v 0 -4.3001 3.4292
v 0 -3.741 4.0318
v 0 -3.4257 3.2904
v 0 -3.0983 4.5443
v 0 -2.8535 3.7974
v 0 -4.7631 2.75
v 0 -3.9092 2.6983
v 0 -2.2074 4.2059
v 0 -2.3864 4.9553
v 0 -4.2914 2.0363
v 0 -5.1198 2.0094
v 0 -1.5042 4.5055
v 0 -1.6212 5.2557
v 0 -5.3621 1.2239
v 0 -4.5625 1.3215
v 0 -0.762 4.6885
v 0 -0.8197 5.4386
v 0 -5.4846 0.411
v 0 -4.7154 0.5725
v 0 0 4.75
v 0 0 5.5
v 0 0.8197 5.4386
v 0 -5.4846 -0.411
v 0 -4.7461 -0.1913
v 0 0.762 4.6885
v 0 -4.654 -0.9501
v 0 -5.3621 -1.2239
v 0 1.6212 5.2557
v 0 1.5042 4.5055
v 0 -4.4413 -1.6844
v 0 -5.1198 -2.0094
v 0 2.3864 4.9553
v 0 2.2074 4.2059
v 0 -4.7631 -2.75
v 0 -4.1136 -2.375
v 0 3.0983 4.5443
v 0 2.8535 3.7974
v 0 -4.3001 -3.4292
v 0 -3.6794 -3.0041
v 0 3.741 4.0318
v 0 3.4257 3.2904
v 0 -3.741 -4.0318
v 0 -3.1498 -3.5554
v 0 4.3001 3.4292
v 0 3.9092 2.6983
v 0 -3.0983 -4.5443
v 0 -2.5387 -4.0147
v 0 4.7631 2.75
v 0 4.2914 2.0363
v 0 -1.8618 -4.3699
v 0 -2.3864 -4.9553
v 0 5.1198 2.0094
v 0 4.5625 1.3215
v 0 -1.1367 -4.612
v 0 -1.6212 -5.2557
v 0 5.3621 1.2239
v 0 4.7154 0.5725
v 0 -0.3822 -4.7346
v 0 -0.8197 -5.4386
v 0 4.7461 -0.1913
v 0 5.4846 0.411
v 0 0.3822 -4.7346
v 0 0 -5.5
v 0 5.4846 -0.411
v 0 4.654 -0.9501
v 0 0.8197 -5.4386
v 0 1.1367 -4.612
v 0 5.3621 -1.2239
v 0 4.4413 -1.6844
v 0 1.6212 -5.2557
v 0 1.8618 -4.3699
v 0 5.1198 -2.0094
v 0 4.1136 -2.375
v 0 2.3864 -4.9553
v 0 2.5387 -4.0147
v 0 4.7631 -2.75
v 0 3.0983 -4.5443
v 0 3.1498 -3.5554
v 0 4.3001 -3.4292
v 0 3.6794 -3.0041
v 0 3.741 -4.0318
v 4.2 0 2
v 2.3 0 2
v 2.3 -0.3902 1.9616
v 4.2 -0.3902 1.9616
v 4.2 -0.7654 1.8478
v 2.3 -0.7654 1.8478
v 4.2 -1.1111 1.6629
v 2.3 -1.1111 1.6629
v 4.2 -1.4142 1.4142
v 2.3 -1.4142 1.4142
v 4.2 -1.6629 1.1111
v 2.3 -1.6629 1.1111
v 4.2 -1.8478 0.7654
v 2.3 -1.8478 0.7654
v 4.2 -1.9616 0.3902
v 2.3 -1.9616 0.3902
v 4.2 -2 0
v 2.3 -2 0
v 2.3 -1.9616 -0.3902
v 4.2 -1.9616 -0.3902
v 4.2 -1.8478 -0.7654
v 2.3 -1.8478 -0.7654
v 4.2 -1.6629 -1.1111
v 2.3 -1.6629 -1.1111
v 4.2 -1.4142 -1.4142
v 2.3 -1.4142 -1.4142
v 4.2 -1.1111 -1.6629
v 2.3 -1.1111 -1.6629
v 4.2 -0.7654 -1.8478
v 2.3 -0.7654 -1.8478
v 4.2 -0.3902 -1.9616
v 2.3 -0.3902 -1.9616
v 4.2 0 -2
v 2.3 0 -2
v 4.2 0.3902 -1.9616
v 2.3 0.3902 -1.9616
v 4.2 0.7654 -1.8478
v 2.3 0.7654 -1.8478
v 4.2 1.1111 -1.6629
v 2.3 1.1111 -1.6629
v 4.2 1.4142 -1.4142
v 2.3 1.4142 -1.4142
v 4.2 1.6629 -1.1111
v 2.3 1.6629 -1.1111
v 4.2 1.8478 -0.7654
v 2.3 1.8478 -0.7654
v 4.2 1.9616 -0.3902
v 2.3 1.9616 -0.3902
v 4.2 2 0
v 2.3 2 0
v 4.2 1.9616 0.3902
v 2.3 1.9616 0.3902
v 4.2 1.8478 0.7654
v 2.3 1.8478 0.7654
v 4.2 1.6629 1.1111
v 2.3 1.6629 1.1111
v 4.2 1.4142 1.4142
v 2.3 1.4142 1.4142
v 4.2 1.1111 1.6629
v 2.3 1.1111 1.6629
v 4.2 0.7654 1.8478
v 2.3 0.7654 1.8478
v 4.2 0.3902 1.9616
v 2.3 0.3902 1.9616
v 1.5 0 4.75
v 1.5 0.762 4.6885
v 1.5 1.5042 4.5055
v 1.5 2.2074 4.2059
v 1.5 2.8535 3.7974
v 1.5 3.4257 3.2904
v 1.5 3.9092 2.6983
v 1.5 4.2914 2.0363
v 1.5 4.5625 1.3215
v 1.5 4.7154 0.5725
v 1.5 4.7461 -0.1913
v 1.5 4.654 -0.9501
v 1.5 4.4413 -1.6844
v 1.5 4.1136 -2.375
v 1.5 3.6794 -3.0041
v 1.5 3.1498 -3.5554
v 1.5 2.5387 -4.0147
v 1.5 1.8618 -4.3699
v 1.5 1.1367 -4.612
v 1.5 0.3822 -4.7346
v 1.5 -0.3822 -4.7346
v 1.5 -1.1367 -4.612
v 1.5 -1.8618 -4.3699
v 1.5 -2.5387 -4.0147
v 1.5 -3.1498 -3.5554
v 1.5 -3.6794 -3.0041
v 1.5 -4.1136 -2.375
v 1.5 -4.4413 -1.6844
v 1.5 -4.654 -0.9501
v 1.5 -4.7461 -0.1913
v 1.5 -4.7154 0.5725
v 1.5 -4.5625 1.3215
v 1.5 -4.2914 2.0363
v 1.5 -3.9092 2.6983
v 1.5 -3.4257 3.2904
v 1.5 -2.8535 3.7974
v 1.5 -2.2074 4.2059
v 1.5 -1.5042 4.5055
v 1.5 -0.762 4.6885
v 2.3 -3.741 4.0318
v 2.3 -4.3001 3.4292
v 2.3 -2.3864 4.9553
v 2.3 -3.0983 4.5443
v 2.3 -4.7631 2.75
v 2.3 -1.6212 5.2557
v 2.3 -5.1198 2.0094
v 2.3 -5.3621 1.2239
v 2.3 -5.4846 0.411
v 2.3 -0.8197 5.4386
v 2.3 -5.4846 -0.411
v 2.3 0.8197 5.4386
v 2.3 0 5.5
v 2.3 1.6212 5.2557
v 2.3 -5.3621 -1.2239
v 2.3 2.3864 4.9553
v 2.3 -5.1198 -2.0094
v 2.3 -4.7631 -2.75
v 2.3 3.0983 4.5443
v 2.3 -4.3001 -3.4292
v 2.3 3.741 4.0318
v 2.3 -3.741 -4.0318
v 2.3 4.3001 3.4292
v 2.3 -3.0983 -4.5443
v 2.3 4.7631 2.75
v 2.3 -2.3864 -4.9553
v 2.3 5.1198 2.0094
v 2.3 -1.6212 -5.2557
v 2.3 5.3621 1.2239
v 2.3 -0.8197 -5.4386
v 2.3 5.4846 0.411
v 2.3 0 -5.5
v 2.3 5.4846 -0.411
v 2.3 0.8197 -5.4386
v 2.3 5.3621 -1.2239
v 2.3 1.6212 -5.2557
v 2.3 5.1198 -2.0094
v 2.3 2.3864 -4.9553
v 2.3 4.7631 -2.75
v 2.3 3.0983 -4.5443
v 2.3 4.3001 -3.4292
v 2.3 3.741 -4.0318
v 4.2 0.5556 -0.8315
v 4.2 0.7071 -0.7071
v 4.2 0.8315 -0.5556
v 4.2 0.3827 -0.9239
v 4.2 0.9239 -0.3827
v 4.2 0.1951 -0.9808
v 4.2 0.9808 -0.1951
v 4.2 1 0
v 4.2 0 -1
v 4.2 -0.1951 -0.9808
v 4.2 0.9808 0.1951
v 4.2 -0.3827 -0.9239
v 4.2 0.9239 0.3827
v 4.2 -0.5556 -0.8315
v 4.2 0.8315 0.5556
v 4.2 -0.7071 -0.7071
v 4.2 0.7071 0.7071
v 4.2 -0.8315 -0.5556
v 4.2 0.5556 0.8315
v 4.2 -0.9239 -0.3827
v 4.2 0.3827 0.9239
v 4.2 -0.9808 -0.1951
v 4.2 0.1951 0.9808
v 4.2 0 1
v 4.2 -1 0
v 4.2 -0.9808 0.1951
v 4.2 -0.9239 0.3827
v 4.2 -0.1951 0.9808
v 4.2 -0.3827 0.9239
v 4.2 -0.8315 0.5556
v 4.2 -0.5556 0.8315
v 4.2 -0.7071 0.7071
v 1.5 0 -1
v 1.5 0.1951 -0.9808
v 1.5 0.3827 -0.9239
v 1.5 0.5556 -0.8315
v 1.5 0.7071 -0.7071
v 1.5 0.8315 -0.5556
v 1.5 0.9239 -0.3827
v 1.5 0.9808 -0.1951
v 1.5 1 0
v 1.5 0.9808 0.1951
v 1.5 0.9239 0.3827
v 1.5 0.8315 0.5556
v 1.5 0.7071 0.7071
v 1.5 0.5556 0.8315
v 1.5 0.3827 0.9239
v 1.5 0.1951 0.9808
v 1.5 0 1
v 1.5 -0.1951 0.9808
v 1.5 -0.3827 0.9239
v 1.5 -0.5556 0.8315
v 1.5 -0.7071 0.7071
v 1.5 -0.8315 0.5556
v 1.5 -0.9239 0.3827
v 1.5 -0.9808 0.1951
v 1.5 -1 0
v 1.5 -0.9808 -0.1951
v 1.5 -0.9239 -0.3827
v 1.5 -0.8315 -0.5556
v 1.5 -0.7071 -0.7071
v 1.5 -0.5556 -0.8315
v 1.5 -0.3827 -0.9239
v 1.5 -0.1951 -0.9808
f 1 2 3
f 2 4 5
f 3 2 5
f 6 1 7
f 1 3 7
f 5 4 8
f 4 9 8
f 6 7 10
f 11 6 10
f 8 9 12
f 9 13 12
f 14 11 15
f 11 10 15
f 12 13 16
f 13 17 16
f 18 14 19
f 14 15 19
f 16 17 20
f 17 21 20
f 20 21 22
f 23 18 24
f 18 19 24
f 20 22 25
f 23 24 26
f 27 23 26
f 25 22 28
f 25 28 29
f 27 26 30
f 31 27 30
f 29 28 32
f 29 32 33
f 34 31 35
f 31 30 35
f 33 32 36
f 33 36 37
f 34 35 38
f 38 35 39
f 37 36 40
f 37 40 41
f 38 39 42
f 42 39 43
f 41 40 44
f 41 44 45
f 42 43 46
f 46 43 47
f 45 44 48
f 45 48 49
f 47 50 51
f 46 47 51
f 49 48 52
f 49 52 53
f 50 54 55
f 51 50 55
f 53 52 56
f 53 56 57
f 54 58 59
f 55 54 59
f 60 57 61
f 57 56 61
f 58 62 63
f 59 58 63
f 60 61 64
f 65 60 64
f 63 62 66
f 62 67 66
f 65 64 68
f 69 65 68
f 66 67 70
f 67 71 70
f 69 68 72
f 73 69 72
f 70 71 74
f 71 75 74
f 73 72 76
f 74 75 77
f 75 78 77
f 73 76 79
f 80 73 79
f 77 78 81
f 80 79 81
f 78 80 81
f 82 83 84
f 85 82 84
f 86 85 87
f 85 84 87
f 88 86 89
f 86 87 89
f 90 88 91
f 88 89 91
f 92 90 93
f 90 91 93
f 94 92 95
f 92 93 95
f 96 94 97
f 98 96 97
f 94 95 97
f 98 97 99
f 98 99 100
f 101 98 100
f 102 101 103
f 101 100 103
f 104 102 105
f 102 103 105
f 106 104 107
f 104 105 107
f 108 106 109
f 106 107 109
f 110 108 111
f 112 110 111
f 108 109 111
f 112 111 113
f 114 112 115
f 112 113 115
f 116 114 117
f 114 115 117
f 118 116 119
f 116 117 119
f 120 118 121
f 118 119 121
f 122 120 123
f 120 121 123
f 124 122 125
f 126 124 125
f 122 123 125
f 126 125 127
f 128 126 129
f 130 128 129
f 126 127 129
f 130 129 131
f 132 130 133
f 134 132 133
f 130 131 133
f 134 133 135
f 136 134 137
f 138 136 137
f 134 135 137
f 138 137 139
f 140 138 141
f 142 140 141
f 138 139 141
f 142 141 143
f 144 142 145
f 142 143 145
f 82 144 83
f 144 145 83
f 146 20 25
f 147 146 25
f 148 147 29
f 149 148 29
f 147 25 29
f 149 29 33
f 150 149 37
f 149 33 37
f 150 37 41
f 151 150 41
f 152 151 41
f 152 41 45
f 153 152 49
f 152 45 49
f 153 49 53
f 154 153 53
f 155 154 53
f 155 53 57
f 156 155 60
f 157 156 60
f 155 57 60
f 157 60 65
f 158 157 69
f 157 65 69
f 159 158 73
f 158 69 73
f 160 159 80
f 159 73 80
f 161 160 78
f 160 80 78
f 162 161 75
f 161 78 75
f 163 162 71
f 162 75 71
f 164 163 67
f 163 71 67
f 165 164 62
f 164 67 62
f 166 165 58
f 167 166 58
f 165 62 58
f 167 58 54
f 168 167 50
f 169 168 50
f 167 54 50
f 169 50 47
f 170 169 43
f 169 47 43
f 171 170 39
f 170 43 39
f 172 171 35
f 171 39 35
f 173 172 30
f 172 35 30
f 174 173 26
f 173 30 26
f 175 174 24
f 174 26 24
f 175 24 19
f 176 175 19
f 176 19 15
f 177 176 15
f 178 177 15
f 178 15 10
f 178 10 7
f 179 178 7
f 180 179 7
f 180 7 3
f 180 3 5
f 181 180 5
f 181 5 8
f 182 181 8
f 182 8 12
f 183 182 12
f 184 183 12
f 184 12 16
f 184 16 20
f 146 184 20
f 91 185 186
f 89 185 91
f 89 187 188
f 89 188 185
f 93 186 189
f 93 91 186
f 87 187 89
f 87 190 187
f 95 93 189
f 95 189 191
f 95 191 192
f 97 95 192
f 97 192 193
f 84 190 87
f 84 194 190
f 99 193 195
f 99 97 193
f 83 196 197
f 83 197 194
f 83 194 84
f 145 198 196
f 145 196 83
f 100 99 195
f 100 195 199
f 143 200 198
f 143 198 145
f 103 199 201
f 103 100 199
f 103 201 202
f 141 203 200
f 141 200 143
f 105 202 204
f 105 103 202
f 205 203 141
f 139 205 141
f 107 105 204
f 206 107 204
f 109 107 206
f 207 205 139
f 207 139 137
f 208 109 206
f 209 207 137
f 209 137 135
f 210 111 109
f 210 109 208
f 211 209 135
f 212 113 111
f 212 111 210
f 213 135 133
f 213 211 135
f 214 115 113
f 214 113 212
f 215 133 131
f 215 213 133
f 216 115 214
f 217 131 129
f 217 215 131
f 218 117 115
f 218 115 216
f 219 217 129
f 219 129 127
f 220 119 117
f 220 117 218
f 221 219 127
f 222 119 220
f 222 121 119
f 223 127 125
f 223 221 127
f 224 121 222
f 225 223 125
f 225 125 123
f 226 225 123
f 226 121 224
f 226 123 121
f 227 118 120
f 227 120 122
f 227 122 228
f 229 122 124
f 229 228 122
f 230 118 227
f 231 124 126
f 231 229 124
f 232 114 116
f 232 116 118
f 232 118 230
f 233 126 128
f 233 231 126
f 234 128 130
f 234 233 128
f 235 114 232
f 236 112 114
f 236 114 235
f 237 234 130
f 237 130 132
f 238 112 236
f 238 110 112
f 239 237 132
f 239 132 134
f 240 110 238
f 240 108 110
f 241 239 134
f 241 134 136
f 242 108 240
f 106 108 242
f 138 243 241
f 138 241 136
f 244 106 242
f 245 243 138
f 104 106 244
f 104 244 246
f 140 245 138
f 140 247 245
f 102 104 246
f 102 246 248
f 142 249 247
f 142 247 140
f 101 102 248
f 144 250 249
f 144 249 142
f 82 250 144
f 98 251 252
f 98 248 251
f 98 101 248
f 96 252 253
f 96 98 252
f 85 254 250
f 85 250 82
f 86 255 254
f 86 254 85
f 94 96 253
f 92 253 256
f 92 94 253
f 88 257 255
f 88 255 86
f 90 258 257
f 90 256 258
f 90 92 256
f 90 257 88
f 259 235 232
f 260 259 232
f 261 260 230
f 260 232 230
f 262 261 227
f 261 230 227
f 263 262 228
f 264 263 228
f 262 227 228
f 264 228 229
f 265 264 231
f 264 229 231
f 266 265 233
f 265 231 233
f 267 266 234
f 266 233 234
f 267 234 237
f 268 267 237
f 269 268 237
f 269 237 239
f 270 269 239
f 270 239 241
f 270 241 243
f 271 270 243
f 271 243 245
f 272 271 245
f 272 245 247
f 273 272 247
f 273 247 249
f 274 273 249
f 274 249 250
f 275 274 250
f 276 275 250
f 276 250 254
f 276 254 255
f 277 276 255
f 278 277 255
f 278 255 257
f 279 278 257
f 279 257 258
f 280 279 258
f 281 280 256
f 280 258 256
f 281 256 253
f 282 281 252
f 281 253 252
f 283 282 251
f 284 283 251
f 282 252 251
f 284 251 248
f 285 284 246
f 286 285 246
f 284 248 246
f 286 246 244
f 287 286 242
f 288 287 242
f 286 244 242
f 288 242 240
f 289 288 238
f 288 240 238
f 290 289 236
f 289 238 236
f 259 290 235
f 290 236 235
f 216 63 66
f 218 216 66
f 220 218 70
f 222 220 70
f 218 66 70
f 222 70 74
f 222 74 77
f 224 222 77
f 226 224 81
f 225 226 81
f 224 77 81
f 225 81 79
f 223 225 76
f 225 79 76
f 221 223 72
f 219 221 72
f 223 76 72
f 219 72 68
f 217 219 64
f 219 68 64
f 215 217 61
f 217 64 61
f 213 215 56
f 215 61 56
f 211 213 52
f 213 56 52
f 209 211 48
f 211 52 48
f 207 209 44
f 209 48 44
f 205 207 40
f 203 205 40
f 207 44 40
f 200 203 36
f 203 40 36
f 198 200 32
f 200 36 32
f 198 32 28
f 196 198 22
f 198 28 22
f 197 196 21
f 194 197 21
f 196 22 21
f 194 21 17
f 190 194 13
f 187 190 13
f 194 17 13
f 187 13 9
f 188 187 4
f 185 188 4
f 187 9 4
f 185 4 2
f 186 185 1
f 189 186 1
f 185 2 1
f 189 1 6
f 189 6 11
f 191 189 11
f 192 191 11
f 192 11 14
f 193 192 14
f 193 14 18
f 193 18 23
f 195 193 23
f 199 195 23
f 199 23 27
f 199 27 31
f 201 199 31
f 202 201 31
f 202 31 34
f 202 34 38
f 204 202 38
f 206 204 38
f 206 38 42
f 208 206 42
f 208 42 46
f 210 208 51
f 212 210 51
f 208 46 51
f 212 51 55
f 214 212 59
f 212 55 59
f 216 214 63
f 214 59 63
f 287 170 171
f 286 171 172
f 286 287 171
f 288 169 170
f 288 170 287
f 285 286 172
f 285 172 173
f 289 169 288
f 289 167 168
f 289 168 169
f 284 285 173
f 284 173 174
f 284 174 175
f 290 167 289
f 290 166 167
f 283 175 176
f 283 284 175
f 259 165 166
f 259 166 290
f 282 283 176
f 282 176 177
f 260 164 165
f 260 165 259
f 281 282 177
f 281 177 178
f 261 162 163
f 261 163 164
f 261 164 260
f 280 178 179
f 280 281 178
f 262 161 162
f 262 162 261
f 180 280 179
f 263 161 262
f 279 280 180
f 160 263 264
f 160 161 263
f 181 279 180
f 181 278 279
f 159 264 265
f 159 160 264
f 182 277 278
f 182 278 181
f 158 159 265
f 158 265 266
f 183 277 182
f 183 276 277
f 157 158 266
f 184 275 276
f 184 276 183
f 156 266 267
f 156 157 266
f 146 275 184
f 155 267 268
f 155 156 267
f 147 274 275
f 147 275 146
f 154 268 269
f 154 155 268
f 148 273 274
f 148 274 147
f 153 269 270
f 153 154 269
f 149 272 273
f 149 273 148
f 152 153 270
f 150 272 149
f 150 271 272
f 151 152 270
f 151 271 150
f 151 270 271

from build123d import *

# Parameters (mm, degrees)
SKETCH_1_R          = 5.5
EXTRUDE_1_DEPTH     = 2.3
SKETCH_2_R          = 2
EXTRUDE_2_DEPTH     = 1.9
SKETCH_3_R          = 1
CUT_EXTRUDE_1_DEPTH = 9.839683252
SKETCH_4_R          = 4.75
CUT_EXTRUDE_2_DEPTH = 1.5


with BuildPart() as part:
    # 草图1 → 凸台-拉伸1 (new body)
    with BuildSketch(Plane(origin=(0, 0, 0), x_dir=(0, 0, -1), z_dir=(1, 0, 0))):
        Circle(SKETCH_1_R)
    extrude(amount=EXTRUDE_1_DEPTH)

    # 草图2 → 凸台-拉伸2 (add)
    with BuildSketch(Plane(origin=(2.3, 0, 0), x_dir=(0, 0, -1), z_dir=(1, 0, 0))):
        with Locations(Location((0, 0, 0), (0, 0, 180))):
            Circle(SKETCH_2_R)
    extrude(amount=EXTRUDE_2_DEPTH)

    # 草图3 → 切除-拉伸1 (cut, through all)
    with BuildSketch(Plane(origin=(4.2, 0, 0), x_dir=(0, 0, -1), z_dir=(1, 0, 0))):
        Circle(SKETCH_3_R)
    extrude(amount=-CUT_EXTRUDE_1_DEPTH, mode=Mode.SUBTRACT)

    # 草图4 → 切除-拉伸2 (cut)
    with BuildSketch(Plane.ZY):
        Circle(SKETCH_4_R)
    extrude(amount=-CUT_EXTRUDE_2_DEPTH, mode=Mode.SUBTRACT)


solid = part.part
